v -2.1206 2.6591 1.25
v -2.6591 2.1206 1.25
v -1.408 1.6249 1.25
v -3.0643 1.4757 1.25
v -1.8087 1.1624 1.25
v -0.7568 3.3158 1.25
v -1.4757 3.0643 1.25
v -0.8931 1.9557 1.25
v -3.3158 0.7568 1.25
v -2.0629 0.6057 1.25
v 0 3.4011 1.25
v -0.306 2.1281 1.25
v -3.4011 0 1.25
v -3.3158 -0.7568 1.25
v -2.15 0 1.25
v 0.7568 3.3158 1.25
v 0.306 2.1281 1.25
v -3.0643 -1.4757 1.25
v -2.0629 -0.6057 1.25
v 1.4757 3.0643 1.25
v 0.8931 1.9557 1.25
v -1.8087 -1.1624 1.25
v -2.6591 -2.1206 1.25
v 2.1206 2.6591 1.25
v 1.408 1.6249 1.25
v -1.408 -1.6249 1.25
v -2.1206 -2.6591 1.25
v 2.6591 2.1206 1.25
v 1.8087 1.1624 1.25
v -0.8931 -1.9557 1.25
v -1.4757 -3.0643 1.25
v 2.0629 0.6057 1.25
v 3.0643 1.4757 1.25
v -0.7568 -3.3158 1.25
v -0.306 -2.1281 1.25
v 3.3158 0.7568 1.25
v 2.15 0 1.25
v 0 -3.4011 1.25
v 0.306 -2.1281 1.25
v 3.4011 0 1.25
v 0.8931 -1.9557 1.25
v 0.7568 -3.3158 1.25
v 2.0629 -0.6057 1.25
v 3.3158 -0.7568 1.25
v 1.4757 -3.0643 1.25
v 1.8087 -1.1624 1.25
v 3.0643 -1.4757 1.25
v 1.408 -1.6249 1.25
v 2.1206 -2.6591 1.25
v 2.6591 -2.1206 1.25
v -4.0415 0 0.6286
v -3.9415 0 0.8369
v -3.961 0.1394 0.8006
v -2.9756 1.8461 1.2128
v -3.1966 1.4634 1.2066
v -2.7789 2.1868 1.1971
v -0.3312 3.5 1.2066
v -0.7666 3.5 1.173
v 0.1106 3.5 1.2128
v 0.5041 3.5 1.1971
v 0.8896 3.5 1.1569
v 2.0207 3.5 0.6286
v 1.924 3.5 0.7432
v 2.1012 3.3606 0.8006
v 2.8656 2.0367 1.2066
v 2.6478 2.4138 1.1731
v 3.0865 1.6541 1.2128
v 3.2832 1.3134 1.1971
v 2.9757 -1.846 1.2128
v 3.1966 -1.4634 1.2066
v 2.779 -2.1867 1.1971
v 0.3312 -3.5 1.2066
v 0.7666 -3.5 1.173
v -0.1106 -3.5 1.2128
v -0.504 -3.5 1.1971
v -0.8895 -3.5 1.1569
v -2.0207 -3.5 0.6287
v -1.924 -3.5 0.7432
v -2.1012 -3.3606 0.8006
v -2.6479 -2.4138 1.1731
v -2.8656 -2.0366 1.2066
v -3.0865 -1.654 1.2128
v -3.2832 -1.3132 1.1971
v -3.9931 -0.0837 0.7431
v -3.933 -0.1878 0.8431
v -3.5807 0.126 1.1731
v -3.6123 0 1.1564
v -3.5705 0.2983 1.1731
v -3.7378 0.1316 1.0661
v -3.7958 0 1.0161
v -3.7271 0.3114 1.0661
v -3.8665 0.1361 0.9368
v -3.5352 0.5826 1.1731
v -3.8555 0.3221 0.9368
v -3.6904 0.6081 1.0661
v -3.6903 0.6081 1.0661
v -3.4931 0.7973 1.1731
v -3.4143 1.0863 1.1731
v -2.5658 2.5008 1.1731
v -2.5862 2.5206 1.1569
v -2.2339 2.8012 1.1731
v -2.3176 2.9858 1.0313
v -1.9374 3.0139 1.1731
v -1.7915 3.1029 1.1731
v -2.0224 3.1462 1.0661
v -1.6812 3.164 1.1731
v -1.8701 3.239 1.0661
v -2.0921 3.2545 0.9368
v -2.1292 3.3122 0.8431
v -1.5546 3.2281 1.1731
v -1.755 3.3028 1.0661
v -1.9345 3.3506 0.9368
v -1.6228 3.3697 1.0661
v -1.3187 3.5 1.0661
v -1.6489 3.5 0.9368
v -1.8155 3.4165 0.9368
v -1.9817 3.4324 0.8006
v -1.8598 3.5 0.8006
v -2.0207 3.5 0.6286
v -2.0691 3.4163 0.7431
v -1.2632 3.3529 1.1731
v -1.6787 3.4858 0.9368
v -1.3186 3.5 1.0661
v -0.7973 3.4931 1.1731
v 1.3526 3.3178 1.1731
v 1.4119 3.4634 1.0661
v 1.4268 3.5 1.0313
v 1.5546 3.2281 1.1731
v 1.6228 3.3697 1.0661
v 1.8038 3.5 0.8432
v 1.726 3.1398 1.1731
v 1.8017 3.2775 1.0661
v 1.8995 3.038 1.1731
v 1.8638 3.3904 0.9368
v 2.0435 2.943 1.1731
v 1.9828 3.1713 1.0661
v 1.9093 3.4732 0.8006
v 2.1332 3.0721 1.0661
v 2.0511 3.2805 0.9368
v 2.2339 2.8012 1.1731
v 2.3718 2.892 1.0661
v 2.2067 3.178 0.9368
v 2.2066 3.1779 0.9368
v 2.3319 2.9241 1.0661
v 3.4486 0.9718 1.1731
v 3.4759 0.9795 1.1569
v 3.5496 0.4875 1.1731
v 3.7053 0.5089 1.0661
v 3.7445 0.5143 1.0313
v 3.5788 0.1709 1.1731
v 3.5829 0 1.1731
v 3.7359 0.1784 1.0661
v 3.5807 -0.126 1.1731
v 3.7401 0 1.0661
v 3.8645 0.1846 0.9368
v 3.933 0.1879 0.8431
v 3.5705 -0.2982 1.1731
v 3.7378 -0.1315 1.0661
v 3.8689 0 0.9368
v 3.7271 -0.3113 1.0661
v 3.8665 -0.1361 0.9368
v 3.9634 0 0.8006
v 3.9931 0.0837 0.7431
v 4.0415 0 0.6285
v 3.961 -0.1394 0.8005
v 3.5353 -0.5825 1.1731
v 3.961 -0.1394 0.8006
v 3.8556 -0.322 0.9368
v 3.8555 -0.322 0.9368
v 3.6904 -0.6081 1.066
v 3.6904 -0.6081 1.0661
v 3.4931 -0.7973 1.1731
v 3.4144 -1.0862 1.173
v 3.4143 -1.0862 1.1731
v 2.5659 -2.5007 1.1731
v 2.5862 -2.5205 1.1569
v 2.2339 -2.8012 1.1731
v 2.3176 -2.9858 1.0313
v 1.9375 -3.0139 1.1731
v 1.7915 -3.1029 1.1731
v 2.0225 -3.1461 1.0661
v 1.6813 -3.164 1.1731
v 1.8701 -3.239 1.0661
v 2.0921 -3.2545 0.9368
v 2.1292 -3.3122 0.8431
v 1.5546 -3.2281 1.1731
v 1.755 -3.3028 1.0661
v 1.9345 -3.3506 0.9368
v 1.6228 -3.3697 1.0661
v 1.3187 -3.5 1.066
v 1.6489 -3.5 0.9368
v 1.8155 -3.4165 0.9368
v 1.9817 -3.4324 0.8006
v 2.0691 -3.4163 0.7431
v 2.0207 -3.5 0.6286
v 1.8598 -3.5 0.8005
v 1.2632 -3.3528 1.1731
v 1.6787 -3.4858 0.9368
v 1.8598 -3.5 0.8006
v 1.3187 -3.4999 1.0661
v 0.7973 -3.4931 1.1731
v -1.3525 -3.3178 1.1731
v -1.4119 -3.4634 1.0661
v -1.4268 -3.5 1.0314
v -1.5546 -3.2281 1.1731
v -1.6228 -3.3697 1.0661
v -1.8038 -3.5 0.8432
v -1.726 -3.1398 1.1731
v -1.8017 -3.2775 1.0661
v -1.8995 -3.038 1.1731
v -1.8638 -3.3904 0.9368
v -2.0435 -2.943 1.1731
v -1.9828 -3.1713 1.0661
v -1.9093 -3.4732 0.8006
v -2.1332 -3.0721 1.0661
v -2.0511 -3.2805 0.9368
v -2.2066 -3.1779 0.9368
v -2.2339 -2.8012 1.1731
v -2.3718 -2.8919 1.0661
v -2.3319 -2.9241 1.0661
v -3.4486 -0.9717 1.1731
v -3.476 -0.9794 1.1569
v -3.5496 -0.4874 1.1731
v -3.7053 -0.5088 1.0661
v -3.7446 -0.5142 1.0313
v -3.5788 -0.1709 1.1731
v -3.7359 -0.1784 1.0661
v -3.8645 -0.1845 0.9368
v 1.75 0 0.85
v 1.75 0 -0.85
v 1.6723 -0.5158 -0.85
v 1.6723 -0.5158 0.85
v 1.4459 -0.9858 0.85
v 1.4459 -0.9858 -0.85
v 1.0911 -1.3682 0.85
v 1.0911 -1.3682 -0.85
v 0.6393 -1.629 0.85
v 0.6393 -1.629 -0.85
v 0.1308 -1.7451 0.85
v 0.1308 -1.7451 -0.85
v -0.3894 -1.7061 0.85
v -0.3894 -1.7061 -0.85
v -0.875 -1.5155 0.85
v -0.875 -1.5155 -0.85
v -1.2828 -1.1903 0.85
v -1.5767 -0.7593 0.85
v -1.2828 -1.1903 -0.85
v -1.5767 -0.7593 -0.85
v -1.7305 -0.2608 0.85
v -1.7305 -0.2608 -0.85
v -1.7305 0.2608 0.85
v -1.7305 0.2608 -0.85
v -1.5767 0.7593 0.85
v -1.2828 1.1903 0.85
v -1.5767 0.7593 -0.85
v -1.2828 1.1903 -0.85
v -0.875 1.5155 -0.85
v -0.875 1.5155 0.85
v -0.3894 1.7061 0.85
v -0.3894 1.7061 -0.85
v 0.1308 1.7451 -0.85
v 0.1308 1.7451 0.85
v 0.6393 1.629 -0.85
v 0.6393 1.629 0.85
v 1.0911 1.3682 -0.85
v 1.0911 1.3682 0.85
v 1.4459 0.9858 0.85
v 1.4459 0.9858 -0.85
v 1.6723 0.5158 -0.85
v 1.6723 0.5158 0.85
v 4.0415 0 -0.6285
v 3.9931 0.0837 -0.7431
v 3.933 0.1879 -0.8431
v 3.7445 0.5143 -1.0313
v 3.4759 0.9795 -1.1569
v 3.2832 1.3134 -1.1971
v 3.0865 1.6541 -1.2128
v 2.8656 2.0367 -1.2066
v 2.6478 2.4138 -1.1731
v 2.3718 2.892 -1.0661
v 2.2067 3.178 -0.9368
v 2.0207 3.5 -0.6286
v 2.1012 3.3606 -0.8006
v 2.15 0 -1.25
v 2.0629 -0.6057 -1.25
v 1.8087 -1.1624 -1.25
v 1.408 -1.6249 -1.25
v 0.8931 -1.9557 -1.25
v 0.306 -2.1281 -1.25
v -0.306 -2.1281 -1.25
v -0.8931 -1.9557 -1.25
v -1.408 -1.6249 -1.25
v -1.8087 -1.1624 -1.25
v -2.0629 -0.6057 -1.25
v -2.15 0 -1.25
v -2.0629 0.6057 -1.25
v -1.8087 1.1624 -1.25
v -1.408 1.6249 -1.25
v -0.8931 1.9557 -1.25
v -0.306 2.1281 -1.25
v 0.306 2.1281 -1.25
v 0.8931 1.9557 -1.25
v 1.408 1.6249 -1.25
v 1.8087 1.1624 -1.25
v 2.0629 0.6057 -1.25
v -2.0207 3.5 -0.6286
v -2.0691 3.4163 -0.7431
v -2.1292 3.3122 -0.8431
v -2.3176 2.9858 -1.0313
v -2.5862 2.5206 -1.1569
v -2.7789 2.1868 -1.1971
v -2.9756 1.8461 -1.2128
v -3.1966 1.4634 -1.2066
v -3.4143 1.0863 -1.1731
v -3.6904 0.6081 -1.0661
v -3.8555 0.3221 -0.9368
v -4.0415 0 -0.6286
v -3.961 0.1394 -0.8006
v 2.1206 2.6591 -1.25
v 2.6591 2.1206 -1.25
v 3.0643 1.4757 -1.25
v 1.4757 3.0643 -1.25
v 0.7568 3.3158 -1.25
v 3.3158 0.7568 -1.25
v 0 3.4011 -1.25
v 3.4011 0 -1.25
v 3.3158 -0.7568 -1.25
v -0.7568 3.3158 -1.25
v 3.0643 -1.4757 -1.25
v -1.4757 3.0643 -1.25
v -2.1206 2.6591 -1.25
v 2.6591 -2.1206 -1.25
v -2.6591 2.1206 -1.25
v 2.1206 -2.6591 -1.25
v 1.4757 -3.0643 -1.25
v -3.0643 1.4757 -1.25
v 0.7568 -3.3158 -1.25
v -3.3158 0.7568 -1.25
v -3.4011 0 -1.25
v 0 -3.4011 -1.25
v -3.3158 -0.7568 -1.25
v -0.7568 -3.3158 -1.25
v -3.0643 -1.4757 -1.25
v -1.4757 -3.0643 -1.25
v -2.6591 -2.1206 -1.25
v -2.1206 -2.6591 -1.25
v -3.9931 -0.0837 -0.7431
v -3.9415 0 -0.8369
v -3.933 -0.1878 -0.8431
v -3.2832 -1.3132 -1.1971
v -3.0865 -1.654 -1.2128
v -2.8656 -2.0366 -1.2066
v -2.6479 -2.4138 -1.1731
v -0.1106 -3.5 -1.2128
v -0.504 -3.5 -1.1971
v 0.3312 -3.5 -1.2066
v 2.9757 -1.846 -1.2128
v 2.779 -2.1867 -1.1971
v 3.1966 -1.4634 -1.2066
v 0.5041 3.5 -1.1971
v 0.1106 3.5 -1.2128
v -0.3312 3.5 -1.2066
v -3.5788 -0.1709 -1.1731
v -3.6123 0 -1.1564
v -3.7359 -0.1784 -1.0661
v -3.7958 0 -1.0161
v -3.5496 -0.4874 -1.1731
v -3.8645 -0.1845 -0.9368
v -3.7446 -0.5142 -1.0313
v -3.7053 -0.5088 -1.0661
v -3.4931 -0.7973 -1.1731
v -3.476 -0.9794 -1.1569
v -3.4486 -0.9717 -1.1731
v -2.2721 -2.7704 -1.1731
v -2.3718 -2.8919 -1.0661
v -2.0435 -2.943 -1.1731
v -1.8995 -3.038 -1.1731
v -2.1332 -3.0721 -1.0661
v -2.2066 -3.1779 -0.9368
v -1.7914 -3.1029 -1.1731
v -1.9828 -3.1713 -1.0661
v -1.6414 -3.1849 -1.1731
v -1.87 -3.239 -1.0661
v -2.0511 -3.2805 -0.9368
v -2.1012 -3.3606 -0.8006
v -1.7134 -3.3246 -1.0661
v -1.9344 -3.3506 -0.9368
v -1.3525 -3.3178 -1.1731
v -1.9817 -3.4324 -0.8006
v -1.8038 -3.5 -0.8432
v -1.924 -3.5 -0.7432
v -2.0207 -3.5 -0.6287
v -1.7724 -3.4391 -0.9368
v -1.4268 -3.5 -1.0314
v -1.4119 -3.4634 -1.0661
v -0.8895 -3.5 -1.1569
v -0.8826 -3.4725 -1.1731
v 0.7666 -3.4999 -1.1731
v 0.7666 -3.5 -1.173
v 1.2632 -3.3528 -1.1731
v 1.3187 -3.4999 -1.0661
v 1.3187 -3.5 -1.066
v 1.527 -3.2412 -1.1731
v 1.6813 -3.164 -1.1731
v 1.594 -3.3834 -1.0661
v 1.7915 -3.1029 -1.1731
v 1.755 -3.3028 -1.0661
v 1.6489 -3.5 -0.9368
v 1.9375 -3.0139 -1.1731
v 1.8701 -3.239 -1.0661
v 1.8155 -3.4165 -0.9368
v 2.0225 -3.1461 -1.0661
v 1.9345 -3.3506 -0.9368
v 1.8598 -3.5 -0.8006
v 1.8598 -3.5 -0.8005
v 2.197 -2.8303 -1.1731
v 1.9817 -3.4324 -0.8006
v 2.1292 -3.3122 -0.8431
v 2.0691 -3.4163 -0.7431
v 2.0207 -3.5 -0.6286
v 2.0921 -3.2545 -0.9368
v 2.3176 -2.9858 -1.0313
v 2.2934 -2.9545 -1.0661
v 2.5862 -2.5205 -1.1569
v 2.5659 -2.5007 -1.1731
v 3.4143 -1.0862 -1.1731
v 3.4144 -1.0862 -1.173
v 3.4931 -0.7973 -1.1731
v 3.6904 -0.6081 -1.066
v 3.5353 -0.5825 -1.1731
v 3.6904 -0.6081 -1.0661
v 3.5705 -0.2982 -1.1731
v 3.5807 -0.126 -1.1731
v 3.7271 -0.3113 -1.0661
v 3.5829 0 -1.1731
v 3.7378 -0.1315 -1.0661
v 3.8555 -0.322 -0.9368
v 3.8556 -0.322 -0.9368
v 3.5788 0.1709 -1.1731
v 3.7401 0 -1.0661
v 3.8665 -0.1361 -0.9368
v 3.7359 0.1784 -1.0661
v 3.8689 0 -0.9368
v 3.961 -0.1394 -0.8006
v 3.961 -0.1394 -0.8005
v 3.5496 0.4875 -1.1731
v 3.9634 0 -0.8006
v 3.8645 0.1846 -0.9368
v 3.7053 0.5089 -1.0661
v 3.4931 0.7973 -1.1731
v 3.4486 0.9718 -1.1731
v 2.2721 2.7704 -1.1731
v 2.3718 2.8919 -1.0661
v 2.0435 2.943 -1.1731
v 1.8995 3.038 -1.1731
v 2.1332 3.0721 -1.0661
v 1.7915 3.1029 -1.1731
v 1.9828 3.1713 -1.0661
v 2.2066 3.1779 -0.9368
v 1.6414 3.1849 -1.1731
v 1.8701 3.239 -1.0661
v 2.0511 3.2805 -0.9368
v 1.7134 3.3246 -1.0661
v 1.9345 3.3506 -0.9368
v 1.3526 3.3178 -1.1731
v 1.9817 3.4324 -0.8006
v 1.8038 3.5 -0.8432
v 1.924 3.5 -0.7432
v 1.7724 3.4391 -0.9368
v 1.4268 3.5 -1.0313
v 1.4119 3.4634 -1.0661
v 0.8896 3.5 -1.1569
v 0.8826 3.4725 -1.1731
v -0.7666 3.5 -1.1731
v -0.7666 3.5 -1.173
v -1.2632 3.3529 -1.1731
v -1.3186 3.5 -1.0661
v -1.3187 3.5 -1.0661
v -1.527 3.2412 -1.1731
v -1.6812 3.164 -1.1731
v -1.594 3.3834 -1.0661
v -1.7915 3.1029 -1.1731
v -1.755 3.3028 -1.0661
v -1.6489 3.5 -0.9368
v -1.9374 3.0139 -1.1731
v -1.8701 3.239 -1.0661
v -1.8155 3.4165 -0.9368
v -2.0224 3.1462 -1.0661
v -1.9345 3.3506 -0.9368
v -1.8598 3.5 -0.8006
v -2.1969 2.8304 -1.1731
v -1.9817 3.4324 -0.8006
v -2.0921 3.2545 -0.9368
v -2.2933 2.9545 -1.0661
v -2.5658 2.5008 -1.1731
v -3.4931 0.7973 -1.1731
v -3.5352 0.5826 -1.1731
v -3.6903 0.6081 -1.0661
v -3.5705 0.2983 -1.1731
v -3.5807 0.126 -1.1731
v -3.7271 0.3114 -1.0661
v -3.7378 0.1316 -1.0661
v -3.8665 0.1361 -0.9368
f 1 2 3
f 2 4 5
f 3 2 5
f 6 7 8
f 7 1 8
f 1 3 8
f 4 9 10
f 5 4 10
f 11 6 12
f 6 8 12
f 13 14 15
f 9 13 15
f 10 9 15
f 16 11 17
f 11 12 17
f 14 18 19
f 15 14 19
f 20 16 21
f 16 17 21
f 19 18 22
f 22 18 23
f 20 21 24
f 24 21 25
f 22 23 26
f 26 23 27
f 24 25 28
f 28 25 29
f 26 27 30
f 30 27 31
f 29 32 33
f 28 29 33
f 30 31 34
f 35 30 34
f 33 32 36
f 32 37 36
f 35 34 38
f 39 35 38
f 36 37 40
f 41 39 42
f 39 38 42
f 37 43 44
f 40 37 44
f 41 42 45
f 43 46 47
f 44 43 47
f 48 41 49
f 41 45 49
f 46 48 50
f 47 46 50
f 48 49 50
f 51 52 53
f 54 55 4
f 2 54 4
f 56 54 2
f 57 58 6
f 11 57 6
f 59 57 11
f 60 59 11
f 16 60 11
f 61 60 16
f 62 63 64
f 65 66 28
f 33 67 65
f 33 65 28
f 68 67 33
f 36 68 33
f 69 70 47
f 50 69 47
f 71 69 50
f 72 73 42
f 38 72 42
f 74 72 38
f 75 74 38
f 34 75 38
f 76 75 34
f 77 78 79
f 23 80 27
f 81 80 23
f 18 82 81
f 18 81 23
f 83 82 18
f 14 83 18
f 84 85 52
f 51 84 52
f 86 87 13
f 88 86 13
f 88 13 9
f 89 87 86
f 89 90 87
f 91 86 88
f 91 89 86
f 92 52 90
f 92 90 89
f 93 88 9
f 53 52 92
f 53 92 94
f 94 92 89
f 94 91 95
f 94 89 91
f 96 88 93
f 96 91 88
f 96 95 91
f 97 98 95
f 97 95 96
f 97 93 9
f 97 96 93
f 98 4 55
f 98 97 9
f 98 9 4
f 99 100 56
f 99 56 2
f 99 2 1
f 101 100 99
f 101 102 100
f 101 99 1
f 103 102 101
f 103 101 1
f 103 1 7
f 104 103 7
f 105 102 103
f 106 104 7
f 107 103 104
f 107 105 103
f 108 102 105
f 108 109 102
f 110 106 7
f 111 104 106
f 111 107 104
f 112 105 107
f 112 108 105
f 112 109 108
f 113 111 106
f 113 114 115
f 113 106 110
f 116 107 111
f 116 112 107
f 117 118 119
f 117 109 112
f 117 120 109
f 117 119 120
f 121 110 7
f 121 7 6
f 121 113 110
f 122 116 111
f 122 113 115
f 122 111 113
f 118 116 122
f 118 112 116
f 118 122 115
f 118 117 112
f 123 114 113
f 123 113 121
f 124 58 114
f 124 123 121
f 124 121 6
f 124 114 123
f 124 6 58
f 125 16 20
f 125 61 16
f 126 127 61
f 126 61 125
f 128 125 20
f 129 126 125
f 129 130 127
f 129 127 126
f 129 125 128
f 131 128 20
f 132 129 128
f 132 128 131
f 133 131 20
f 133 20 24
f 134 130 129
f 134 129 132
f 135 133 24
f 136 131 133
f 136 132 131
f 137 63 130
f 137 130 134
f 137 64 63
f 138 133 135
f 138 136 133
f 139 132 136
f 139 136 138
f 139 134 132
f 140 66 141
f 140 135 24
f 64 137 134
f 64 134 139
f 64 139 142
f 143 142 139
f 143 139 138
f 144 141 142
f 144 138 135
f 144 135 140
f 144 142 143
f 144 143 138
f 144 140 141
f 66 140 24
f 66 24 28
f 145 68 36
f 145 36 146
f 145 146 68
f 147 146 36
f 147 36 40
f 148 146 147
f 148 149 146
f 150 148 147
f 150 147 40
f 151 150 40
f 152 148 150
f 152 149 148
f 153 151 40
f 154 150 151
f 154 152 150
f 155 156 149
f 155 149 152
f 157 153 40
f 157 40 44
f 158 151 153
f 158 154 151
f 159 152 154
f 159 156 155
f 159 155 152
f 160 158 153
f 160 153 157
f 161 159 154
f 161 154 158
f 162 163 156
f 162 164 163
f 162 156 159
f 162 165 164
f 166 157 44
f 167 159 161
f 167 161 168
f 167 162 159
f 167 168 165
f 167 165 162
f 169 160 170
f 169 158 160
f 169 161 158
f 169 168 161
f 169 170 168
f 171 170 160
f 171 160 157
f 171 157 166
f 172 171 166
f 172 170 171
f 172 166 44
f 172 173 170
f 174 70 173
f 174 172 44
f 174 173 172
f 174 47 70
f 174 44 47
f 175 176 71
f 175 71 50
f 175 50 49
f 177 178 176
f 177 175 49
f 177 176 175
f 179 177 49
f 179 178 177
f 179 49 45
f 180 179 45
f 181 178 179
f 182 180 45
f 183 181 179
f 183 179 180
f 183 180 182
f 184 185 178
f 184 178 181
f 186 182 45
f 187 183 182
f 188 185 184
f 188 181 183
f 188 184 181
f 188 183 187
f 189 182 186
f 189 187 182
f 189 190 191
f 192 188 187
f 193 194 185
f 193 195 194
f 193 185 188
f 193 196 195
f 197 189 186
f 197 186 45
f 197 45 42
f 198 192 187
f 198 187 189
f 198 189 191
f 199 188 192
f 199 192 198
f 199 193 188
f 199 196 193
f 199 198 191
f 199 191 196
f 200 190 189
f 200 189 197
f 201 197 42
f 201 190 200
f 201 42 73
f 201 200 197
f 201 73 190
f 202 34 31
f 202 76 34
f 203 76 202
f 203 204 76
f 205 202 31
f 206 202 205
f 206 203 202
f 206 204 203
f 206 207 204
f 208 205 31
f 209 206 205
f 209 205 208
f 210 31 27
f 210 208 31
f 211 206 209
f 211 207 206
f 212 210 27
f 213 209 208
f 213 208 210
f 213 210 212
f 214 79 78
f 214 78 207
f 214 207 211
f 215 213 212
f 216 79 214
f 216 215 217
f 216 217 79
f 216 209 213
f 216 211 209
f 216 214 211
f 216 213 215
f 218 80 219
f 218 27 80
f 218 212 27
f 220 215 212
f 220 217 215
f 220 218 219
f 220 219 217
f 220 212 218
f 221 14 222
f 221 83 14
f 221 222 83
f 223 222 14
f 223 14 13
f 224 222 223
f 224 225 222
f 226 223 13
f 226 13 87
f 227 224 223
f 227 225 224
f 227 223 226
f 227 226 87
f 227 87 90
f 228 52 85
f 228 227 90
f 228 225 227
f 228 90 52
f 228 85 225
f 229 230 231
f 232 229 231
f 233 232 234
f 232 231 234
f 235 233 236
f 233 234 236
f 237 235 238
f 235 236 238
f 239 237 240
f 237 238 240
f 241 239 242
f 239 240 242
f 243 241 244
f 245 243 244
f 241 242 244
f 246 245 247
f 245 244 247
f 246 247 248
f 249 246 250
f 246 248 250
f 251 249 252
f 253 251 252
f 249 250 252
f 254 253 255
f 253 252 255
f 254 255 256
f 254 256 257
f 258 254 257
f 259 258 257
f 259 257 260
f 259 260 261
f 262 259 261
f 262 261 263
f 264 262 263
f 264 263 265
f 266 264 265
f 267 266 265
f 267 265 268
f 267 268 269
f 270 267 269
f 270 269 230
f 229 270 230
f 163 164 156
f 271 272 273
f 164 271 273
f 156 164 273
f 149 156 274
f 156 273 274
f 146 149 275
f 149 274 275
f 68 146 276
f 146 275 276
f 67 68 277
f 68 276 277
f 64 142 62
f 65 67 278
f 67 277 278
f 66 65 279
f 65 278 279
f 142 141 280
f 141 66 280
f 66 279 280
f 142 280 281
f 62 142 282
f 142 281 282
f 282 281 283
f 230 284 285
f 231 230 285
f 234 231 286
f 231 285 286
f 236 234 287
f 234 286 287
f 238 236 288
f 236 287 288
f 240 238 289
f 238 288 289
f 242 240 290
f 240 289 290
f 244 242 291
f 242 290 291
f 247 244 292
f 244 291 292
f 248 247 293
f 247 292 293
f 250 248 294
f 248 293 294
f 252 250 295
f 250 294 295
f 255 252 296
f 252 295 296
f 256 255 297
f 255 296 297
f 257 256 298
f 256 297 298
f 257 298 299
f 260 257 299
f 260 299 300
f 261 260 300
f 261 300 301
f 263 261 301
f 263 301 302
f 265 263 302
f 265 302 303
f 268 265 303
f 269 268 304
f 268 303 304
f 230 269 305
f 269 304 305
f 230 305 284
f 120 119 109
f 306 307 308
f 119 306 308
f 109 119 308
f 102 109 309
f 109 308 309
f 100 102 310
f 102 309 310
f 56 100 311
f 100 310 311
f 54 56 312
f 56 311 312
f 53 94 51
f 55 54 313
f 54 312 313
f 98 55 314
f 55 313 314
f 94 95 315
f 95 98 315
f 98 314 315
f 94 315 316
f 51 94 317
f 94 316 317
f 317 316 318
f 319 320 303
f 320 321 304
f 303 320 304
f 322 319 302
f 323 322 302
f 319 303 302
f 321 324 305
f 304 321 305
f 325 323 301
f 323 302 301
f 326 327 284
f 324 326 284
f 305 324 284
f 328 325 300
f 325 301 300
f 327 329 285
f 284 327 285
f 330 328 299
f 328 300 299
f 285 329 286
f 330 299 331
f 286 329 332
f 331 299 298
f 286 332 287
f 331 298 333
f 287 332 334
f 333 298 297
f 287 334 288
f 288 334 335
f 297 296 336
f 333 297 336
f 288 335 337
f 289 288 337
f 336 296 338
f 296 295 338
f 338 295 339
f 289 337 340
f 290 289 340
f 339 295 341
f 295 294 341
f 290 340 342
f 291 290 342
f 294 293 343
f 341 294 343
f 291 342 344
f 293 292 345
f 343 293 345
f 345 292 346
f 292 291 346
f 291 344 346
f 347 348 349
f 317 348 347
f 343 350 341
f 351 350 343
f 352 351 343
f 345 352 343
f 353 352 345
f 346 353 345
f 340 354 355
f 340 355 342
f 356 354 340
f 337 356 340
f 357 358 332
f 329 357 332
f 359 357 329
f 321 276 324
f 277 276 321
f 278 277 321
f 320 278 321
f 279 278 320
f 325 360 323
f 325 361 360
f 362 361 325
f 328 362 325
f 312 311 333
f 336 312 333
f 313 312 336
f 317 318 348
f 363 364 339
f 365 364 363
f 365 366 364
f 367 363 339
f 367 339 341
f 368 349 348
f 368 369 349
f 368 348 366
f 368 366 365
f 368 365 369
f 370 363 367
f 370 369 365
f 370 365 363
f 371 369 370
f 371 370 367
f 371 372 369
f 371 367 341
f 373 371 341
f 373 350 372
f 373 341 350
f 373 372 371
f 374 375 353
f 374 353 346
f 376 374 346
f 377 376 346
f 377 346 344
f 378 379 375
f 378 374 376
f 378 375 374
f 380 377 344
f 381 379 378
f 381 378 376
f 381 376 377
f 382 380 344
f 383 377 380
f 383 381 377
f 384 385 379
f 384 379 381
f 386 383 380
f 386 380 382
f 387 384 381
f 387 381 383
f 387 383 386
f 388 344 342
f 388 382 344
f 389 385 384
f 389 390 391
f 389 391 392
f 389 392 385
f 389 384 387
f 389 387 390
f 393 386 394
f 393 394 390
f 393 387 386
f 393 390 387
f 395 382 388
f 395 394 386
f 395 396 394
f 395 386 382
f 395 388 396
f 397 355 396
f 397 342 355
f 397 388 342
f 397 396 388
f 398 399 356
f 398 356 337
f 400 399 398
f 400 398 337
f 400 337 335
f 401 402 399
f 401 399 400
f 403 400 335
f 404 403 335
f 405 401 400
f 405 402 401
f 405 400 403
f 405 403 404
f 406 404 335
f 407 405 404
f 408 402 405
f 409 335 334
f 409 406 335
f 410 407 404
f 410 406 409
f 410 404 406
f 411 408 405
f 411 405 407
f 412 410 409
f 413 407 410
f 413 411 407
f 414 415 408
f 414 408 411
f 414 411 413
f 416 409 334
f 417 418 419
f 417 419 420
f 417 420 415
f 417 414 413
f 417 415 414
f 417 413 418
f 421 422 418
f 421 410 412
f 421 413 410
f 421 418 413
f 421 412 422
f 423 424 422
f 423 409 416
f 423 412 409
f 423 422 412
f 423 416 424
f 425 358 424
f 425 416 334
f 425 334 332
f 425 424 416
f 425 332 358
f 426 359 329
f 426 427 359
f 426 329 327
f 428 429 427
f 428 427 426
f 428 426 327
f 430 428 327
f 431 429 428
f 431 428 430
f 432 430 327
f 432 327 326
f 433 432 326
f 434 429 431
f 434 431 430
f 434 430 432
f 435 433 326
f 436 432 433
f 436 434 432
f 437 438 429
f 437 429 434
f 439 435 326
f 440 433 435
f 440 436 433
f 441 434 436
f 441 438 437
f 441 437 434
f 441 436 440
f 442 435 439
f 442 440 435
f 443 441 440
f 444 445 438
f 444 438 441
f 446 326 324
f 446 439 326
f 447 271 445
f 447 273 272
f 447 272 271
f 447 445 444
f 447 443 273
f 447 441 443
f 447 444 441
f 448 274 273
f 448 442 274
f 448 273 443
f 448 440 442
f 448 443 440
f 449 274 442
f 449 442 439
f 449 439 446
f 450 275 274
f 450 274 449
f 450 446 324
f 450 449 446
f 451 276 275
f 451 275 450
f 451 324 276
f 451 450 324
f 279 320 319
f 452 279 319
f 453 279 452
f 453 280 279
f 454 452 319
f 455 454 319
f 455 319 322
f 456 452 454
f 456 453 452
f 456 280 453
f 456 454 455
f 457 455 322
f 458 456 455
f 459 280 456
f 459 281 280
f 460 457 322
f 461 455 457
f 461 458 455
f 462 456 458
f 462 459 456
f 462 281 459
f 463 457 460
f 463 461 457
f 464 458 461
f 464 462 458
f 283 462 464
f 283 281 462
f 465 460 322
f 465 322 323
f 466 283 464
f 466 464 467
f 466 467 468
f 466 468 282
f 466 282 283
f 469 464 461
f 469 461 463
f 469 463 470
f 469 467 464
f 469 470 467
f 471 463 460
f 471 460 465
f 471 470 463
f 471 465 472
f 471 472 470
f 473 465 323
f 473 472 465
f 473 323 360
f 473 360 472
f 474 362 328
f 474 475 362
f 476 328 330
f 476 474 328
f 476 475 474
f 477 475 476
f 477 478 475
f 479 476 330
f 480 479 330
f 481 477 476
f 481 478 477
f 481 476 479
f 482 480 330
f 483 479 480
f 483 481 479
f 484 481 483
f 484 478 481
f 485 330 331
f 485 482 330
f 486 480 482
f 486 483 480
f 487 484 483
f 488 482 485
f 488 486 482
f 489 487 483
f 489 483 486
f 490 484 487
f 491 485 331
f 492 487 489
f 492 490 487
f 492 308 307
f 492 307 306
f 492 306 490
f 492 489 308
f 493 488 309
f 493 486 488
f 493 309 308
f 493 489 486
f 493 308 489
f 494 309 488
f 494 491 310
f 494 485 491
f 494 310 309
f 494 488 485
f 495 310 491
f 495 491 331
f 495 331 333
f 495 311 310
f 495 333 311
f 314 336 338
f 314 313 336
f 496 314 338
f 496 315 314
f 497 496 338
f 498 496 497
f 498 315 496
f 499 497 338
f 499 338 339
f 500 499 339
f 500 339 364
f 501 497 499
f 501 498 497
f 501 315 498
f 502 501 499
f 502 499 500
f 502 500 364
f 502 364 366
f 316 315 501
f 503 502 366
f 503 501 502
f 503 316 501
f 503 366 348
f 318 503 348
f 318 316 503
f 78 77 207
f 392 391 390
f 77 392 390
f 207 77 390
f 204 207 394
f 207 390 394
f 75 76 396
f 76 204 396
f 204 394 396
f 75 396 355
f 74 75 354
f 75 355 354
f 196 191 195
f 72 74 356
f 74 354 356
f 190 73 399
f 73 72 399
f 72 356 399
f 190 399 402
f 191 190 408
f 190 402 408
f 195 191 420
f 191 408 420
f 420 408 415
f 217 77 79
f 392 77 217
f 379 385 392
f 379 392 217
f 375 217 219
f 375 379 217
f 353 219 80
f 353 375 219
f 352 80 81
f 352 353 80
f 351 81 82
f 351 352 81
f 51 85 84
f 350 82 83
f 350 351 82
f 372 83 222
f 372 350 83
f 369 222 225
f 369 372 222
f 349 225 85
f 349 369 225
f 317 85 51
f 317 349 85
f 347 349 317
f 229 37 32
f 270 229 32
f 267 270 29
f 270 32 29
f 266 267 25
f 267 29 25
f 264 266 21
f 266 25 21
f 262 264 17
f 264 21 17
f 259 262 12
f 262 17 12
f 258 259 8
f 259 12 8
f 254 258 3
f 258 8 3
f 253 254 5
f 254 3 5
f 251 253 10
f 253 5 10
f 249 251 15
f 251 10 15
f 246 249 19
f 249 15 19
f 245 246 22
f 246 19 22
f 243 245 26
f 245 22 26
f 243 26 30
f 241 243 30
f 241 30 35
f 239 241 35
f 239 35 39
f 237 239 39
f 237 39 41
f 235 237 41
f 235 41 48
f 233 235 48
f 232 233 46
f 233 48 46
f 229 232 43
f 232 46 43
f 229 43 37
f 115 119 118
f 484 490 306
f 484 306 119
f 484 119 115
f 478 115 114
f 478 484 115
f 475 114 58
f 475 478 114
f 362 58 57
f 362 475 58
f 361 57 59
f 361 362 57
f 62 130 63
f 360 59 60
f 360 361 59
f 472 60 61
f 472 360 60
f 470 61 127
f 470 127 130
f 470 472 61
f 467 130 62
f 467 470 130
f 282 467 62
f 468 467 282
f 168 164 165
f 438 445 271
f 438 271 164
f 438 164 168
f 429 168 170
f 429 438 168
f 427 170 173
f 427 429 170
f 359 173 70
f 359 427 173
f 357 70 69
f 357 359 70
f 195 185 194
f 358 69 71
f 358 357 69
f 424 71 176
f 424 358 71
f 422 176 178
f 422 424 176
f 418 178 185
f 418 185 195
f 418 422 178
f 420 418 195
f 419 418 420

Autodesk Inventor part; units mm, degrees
ref_plane "YZ Plane" through (0, 0, 0) normal (1, 0, 0) x (0, 1, 0)
ref_plane "XZ Plane" through (0, 0, 0) normal (0, 1, 0) x (-1, 0, 0)
ref_plane "XY Plane" through (0, 0, 0) normal (0, 0, 1) x (1, 0, 0)
sketch "Sketch1" plane through (0, 0, 0) normal (0, 0, 1) x (1, 0, 0)
  line L0 (-4.0776, 0) -> (11.9806, 0)
  line L1 (0, 5.675) -> (0, -5.0865)
  line L2 (-3.6188, 3.5) -> (4.159, 3.5)
  line L3 (-3.3522, -3.5) -> (4.4256, -3.5)
  line L4 (-1.2217, -4.8839) -> (-5.1106, 1.8518)
  line L5 (4.7072, -1.1531) -> (0.8183, 5.5827)
  line L6 (4.8405, 1.3839) -> (0.9516, -5.3518)
  line L7 (-1.355, 4.6531) -> (-5.2439, -2.0827)
  circle A0 centre (0, 0) radius 1.75
  point P0 (4.0415, 0)
  point P1 (2.0207, 3.5)
  point P2 (-2.0207, 3.5)
  point P3 (-4.0415, 0)
  point P4 (-2.0207, -3.5)
  point P5 (2.0207, -3.5)
  dimension "d0" = 7
  dimension "d3" = 360
  dimension "d5" = 3.5
extrude "Extrusion1" add sketch "Sketch1" along normal mid plane 2.5 contours L7 L2 L1 A0 L0 | L0 A0 L1 L3 L4 | L1 L2 L5 L0 A0 | A0 L0 L6 L3 L1
sketch "Sketch2" plane through (0, 0, 0) normal (0, 1, 0) x (-1, 0, 0)
  circle A0 centre (3.1105, -0.3099) radius 0.984
  line L0 (0, -2.0822) -> (0, 3.6497)
  line L1 (2.0207, -1.25) -> (4.0415, -1.25) projected
  line L2 (3.4011, -1.25) -> (4.0415, -1.25)
  line L3 (4.0415, -1.25) -> (4.0415, 0.0088)
  point P0 (0, 0)
  point P1 (4.0415, -0.6286)
  point P2 (2.8198, -1.25)
  dimension "d11" = 1.968
  dimension "d12" = 0.9401
  dimension "d13" = 0.931
revolve "Revolution1" cut sketch "Sketch2" angle 360 about axis through (0, 0, -2.0822) along (0, 0, 1) picked at (3.9263, -1.0343) contours L3 L1 A0 | L1 A0
mirror "Mirror1" about plane through (0, 0, 0) normal (0, 0, 1) of "Revolution1"
thread "Thread1" size "M3.5x0.6" class "6H" standard "ANSI Metric M Profile" length 45
chamfer "Chamfer1" distance 0.4 angle 45 1 edges at (-1.75, 0, 1.25)
chamfer "Chamfer2" distance 0.4 angle 45 1 edges at (-1.75, 0, -1.25)
properties part number "somun"
